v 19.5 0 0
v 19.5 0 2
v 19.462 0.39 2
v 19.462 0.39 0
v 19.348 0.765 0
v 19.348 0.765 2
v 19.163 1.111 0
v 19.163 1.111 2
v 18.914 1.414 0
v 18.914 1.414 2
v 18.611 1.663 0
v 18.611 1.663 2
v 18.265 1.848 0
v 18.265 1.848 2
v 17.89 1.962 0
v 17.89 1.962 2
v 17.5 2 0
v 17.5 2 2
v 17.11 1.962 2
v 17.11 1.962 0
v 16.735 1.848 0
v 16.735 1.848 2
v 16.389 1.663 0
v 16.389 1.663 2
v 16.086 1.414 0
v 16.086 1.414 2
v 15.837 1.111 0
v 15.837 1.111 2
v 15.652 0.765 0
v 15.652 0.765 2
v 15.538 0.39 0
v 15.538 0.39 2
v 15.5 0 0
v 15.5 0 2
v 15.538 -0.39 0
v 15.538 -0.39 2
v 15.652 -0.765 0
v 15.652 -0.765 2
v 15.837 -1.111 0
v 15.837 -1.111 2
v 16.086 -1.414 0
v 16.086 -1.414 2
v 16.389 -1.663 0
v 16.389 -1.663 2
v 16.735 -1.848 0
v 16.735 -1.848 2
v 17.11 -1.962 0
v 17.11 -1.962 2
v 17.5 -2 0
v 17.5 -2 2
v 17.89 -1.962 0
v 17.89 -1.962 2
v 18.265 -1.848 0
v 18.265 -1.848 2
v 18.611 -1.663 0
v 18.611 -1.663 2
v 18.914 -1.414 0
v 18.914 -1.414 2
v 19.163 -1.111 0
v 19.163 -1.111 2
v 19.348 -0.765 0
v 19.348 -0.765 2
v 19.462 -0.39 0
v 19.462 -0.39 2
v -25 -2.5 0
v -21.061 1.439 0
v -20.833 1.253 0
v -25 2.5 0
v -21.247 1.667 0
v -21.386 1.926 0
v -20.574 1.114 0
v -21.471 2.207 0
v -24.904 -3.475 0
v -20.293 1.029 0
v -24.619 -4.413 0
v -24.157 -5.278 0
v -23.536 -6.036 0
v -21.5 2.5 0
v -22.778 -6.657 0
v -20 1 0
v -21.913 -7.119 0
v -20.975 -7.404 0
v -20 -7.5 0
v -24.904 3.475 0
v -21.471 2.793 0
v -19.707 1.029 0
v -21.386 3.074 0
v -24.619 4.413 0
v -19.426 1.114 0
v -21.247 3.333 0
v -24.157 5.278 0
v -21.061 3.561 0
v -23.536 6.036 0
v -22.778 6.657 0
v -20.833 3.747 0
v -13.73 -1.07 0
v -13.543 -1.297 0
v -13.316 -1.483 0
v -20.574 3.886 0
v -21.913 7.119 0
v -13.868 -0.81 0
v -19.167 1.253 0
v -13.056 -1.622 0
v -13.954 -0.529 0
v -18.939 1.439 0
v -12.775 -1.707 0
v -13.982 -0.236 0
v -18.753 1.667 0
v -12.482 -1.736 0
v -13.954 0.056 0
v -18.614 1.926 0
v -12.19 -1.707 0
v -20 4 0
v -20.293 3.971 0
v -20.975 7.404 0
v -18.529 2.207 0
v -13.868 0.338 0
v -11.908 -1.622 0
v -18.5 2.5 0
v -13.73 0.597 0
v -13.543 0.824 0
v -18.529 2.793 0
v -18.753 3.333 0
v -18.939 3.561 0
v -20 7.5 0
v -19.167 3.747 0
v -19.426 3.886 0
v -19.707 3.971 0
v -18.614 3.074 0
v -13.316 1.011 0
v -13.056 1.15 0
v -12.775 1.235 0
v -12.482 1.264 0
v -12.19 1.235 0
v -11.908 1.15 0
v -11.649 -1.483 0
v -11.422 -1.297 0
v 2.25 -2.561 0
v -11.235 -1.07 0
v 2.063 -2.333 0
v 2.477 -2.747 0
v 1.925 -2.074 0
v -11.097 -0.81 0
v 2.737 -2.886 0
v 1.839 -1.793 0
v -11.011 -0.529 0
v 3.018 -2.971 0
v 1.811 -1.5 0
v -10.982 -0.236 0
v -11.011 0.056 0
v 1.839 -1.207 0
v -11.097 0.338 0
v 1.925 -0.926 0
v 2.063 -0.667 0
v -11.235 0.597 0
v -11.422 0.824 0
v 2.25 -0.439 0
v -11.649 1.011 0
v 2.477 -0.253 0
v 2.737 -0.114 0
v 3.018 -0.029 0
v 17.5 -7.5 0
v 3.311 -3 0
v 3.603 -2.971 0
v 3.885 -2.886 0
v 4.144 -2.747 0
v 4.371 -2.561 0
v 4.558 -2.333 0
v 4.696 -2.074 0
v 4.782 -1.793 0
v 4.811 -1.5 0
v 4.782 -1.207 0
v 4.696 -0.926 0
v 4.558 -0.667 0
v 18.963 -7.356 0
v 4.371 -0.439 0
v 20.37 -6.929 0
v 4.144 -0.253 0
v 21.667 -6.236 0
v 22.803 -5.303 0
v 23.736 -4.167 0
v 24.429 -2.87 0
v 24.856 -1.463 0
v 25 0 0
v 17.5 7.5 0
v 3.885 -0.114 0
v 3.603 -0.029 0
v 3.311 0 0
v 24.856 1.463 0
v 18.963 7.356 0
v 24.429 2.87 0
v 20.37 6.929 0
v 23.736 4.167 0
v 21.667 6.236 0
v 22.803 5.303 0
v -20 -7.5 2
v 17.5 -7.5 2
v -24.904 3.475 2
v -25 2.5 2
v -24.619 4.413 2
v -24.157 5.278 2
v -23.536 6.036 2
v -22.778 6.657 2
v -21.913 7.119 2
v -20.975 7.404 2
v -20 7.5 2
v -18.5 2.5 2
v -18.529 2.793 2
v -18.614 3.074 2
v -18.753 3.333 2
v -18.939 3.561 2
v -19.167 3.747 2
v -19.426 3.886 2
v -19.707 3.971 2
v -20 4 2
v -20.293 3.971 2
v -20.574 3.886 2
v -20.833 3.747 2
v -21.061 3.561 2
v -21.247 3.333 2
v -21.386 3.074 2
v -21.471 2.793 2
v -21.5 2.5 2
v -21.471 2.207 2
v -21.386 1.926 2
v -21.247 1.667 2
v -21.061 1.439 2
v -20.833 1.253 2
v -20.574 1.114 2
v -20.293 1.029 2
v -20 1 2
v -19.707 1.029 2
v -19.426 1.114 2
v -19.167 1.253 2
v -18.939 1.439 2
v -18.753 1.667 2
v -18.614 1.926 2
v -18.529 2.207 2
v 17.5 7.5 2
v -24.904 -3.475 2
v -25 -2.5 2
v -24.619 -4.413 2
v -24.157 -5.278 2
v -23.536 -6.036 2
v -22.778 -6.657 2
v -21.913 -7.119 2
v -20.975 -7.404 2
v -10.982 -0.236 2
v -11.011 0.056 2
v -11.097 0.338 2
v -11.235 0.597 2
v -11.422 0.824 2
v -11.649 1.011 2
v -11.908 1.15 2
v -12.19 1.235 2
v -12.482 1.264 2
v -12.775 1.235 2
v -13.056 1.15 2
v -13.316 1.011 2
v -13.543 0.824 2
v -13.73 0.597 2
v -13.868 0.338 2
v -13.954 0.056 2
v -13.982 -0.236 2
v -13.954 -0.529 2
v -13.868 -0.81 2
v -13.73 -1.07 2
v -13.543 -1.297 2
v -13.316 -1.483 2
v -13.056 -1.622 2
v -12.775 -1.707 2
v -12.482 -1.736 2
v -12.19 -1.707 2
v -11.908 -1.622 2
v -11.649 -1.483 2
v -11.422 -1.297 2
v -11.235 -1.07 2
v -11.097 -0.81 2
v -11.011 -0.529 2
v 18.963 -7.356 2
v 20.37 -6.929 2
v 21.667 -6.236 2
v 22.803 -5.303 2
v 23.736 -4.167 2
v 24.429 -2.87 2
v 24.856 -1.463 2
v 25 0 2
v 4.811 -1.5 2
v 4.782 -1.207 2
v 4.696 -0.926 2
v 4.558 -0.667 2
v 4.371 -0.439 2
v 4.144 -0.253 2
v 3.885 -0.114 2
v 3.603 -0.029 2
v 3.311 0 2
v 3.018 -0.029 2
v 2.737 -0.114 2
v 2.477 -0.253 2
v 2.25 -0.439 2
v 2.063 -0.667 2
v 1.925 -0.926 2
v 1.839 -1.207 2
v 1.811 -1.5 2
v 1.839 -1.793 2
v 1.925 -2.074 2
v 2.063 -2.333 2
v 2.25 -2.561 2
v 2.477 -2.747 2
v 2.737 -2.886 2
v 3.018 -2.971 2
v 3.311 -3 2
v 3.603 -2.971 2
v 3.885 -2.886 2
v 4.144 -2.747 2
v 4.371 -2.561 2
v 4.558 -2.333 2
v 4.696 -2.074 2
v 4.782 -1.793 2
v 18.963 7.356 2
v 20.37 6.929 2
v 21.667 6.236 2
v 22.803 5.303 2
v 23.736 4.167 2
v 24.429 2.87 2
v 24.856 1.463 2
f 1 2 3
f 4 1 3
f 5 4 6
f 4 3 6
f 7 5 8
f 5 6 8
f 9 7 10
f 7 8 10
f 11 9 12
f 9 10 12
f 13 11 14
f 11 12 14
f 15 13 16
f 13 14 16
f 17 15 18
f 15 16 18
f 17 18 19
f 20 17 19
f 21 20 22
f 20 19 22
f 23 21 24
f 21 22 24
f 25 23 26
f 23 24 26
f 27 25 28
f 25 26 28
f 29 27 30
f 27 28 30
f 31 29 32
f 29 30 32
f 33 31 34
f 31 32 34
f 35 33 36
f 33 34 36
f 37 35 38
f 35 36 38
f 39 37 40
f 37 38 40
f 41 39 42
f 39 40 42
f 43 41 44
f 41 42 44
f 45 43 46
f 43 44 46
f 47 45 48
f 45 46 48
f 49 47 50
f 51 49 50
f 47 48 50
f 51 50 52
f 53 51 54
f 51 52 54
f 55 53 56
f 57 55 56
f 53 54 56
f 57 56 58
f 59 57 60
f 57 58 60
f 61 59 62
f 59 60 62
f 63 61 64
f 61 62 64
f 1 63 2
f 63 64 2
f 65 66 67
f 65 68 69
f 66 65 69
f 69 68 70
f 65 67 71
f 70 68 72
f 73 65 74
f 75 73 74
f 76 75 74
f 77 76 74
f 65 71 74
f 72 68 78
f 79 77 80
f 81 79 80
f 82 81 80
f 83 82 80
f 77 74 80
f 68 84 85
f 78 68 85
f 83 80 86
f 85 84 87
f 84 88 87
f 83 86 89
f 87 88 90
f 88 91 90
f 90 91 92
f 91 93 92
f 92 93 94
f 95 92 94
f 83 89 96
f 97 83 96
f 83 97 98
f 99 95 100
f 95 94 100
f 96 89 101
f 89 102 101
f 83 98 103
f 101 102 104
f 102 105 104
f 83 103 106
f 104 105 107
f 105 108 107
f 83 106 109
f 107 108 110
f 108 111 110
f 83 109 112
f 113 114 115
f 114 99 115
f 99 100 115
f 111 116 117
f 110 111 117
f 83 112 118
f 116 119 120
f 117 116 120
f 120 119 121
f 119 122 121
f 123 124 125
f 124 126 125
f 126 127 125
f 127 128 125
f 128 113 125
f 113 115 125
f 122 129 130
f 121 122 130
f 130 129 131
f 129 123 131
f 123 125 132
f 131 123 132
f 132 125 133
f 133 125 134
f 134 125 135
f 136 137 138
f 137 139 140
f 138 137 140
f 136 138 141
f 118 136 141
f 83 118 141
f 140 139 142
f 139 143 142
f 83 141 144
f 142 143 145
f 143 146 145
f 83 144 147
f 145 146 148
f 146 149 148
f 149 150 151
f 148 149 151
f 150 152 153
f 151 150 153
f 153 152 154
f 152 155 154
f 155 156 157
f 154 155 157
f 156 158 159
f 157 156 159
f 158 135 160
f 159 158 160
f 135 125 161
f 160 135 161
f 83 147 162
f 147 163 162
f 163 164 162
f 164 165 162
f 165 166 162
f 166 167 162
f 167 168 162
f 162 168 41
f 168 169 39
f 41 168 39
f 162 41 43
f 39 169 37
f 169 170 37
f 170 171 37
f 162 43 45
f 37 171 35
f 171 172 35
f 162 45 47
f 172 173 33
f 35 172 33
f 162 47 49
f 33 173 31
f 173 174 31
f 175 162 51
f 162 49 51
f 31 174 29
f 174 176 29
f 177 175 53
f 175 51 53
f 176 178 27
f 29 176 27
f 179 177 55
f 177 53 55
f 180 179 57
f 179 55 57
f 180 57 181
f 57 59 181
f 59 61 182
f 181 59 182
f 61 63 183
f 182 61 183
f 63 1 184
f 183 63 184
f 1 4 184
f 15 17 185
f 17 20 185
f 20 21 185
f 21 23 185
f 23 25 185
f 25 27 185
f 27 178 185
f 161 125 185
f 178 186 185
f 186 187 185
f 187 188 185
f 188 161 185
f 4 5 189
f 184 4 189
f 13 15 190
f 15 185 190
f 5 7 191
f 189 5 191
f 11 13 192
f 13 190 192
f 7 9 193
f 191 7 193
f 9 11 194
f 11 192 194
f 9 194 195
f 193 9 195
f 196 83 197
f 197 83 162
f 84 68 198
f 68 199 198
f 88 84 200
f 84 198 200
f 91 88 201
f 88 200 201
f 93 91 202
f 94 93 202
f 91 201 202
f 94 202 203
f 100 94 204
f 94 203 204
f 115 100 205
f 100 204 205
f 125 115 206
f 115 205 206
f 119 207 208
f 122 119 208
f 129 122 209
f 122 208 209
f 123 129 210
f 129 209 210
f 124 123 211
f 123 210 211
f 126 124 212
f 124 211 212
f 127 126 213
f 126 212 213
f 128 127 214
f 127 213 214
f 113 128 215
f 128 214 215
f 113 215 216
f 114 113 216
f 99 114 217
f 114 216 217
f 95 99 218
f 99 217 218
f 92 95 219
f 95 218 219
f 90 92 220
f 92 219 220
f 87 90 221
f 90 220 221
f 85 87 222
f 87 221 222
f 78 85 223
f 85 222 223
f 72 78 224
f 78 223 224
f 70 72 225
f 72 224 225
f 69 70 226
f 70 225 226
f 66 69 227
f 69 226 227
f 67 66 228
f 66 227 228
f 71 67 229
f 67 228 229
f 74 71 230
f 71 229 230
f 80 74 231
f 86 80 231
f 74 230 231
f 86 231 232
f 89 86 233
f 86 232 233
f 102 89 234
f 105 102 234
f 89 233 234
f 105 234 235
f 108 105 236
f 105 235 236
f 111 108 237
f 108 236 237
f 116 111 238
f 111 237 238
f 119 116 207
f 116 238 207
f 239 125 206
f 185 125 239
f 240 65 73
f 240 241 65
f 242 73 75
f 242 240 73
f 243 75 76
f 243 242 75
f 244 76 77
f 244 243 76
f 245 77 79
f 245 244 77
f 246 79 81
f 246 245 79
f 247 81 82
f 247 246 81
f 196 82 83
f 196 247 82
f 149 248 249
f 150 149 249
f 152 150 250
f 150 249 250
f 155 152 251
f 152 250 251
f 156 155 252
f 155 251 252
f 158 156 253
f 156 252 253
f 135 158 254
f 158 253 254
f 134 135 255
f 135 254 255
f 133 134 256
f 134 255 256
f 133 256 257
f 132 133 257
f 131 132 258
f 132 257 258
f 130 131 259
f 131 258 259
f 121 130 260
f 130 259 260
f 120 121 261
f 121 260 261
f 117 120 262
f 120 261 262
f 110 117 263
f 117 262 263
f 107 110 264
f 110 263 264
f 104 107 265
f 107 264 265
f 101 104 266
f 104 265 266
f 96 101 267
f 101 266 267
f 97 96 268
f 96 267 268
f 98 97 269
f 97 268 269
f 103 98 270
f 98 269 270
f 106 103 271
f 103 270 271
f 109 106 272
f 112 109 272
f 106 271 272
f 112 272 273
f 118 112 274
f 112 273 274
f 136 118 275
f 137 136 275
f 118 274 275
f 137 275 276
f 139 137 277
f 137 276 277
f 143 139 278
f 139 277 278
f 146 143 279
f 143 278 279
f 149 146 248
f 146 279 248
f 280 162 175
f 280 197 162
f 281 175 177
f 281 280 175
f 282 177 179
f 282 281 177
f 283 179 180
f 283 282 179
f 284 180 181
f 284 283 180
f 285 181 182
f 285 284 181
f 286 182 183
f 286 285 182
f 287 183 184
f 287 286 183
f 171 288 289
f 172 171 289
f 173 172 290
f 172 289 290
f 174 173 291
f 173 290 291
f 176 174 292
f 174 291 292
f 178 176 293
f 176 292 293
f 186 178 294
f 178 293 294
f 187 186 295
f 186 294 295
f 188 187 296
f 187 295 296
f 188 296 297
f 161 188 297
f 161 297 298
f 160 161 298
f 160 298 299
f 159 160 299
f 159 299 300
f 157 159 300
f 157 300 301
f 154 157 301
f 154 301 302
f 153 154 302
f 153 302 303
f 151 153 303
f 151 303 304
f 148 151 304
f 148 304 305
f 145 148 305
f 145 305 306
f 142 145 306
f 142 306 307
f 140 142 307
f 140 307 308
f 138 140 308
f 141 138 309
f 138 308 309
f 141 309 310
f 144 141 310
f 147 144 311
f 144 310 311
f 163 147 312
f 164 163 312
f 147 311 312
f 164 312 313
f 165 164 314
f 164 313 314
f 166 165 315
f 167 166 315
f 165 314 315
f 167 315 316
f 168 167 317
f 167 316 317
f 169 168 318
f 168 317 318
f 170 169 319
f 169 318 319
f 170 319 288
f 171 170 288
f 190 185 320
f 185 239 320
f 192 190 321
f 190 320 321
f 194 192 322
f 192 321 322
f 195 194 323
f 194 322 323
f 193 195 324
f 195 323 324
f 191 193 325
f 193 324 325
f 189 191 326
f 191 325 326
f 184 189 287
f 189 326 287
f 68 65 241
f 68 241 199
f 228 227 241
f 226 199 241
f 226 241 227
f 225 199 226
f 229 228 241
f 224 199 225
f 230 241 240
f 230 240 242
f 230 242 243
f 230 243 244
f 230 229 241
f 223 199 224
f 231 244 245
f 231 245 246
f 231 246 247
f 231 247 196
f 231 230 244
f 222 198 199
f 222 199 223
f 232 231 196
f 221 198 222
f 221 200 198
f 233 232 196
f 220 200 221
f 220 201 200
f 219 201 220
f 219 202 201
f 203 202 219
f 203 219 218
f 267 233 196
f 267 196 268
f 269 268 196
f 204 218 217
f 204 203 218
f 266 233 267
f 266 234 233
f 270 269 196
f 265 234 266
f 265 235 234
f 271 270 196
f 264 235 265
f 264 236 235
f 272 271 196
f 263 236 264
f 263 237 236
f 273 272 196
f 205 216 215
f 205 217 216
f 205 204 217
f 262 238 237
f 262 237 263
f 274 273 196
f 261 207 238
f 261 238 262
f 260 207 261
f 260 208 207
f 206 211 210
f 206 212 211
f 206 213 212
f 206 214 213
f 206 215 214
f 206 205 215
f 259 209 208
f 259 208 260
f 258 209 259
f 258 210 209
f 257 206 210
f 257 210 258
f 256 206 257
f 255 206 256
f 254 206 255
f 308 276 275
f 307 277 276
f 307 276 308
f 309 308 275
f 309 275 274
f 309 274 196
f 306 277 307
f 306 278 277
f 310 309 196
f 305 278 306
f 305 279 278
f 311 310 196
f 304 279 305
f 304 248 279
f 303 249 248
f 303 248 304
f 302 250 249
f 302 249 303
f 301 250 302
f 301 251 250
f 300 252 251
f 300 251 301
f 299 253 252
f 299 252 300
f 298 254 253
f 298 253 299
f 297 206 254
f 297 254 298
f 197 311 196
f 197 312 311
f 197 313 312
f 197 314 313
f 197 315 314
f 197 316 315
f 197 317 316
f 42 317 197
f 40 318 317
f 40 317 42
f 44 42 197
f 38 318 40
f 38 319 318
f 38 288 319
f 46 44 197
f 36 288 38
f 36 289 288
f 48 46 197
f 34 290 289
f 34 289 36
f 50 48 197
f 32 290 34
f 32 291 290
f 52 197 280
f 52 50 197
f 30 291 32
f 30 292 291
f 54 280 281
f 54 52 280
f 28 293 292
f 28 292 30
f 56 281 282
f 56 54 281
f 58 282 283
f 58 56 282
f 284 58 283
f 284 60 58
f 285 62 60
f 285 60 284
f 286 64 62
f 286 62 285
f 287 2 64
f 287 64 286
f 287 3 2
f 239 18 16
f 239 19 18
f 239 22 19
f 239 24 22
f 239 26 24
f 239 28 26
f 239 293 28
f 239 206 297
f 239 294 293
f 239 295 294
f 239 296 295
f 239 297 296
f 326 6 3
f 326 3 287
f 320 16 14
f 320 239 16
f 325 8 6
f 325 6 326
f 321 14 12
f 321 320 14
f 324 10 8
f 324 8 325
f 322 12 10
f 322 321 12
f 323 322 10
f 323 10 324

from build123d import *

# Parameters (mm, degrees)
SKETCH_1_W          = 50
SKETCH_1_H          = 15
EXTRUDE_1_DEPTH     = 2
FILLET_1_R          = 5
FILLET_2_R          = 7.5
SKETCH_3_R          = 1.5
SKETCH_3_R_2        = 2
CUT_EXTRUDE_1_DEPTH = 2
SKETCH_4_R          = 1.5
CUT_EXTRUDE_2_DEPTH = 10


with BuildPart() as part:
    # 草图1 → 凸台-拉伸1 (new body)
    with BuildSketch(Plane.XY):
        Rectangle(SKETCH_1_W, SKETCH_1_H)
    extrude(amount=EXTRUDE_1_DEPTH)

    # 圆角1
    fillet_1_edges = [part.edges().sort_by_distance(p)[0] for p in [
        (-25, -7.5, 1),
        (-25, 7.5, 1),
    ]]
    fillet(fillet_1_edges, radius=FILLET_1_R)

    # 圆角2
    fillet_2_edges = [part.edges().sort_by_distance(p)[0] for p in [
        (25, -7.5, 1),
        (25, 7.5, 1),
    ]]
    fillet(fillet_2_edges, radius=FILLET_2_R - 0.0001)  # a hair under: the kernel refuses the full size

    # 草图3 → 切除-拉伸1 (cut)
    with BuildSketch(Plane.XY.offset(2)):
        with Locations((-20, 2.5)):
            Circle(SKETCH_3_R)
        with Locations((-12.482459034, -0.236161147)):
            Circle(SKETCH_3_R)
        with Locations((17.5, 0)):
            Circle(SKETCH_3_R_2)
    extrude(amount=-CUT_EXTRUDE_1_DEPTH, mode=Mode.SUBTRACT)

    # 草图4 → 切除-拉伸2 (cut)
    with BuildSketch(Plane.XY.offset(2)):
        with Locations((3.310591225, -1.5)):
            Circle(SKETCH_4_R)
    extrude(amount=-CUT_EXTRUDE_2_DEPTH, mode=Mode.SUBTRACT)


solid = part.part
